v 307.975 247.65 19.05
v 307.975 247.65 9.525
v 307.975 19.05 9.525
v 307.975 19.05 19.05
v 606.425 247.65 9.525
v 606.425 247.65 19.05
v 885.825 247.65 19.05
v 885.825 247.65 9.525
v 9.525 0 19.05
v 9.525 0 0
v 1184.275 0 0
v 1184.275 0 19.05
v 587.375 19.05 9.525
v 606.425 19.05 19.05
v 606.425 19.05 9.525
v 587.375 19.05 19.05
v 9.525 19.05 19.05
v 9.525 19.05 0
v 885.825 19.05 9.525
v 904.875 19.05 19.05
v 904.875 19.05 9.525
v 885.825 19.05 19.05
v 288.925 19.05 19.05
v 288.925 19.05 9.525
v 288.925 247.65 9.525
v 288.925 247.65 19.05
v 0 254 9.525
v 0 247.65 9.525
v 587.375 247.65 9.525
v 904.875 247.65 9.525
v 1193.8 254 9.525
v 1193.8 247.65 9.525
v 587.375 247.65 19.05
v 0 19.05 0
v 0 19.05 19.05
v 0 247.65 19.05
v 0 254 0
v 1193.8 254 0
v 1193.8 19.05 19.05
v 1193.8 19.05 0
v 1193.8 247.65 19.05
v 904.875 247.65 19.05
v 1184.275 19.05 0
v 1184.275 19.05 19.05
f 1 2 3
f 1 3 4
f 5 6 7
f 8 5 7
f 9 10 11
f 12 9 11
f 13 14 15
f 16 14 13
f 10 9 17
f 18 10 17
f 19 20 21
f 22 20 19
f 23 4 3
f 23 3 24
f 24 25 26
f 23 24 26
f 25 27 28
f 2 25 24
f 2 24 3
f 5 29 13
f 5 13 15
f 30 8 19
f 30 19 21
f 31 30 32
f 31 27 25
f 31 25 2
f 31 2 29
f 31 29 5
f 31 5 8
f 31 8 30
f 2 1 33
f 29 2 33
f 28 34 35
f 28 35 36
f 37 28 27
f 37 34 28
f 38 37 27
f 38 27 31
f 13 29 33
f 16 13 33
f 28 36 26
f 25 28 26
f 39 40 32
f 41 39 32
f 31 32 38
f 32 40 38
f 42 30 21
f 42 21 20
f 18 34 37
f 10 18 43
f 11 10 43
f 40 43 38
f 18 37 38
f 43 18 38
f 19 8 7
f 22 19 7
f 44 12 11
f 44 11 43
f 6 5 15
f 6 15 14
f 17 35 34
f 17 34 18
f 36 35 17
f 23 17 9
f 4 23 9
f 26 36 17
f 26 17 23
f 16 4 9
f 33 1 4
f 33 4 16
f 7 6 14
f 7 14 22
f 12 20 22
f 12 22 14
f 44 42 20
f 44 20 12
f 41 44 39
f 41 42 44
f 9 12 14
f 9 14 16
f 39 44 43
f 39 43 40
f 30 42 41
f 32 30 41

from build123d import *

# Parameters (mm, degrees)
F0_W     = 1193.8
F0_H     = 254
F1_DEPTH = 19.05
F2_W     = 19.05
F2_H     = 9.525
F3_DEPTH = 234.95
F4_W     = 1193.8
F4_H     = 6.35
F5_DEPTH = 9.525
F6_W     = 9.525
F6_H     = 19.05
F7_DEPTH = 25.4


with BuildPart() as f1:
    # F0 (on Top) → F1 (new body)
    with BuildSketch(Plane.XY):
        with Locations((596.9, 127)):
            Rectangle(F0_W, F0_H)
    extrude(amount=F1_DEPTH)

    # F2 (on face) → F3 (cut)
    with BuildSketch(Plane(origin=(0, 254, 0), x_dir=(-1, 0, 0), z_dir=(0, 1, 0))):
        with Locations((-298.45, 14.2875)):
            Rectangle(F2_W, F2_H)
        with Locations((-596.9, 14.2875)):
            Rectangle(F2_W, F2_H)
        with Locations((-895.35, 14.2875)):
            Rectangle(F2_W, F2_H)
    extrude(amount=-F3_DEPTH, mode=Mode.SUBTRACT)

    # F4 (on face) → F5 (cut)
    with BuildSketch(Plane.XY.offset(19.05)):
        with Locations((596.9, 250.825)):
            Rectangle(F4_W, F4_H)
    extrude(amount=-F5_DEPTH, mode=Mode.SUBTRACT)

    # F6 (on face) → F7 (cut)
    with BuildSketch(Plane.XY.offset(19.05)):
        with Locations((4.7625, 9.525)):
            Rectangle(F6_W, F6_H)
        with Locations((1189.0375, 9.525)):
            Rectangle(F6_W, F6_H)
    extrude(amount=-F7_DEPTH, mode=Mode.SUBTRACT)


solid = f1.part
